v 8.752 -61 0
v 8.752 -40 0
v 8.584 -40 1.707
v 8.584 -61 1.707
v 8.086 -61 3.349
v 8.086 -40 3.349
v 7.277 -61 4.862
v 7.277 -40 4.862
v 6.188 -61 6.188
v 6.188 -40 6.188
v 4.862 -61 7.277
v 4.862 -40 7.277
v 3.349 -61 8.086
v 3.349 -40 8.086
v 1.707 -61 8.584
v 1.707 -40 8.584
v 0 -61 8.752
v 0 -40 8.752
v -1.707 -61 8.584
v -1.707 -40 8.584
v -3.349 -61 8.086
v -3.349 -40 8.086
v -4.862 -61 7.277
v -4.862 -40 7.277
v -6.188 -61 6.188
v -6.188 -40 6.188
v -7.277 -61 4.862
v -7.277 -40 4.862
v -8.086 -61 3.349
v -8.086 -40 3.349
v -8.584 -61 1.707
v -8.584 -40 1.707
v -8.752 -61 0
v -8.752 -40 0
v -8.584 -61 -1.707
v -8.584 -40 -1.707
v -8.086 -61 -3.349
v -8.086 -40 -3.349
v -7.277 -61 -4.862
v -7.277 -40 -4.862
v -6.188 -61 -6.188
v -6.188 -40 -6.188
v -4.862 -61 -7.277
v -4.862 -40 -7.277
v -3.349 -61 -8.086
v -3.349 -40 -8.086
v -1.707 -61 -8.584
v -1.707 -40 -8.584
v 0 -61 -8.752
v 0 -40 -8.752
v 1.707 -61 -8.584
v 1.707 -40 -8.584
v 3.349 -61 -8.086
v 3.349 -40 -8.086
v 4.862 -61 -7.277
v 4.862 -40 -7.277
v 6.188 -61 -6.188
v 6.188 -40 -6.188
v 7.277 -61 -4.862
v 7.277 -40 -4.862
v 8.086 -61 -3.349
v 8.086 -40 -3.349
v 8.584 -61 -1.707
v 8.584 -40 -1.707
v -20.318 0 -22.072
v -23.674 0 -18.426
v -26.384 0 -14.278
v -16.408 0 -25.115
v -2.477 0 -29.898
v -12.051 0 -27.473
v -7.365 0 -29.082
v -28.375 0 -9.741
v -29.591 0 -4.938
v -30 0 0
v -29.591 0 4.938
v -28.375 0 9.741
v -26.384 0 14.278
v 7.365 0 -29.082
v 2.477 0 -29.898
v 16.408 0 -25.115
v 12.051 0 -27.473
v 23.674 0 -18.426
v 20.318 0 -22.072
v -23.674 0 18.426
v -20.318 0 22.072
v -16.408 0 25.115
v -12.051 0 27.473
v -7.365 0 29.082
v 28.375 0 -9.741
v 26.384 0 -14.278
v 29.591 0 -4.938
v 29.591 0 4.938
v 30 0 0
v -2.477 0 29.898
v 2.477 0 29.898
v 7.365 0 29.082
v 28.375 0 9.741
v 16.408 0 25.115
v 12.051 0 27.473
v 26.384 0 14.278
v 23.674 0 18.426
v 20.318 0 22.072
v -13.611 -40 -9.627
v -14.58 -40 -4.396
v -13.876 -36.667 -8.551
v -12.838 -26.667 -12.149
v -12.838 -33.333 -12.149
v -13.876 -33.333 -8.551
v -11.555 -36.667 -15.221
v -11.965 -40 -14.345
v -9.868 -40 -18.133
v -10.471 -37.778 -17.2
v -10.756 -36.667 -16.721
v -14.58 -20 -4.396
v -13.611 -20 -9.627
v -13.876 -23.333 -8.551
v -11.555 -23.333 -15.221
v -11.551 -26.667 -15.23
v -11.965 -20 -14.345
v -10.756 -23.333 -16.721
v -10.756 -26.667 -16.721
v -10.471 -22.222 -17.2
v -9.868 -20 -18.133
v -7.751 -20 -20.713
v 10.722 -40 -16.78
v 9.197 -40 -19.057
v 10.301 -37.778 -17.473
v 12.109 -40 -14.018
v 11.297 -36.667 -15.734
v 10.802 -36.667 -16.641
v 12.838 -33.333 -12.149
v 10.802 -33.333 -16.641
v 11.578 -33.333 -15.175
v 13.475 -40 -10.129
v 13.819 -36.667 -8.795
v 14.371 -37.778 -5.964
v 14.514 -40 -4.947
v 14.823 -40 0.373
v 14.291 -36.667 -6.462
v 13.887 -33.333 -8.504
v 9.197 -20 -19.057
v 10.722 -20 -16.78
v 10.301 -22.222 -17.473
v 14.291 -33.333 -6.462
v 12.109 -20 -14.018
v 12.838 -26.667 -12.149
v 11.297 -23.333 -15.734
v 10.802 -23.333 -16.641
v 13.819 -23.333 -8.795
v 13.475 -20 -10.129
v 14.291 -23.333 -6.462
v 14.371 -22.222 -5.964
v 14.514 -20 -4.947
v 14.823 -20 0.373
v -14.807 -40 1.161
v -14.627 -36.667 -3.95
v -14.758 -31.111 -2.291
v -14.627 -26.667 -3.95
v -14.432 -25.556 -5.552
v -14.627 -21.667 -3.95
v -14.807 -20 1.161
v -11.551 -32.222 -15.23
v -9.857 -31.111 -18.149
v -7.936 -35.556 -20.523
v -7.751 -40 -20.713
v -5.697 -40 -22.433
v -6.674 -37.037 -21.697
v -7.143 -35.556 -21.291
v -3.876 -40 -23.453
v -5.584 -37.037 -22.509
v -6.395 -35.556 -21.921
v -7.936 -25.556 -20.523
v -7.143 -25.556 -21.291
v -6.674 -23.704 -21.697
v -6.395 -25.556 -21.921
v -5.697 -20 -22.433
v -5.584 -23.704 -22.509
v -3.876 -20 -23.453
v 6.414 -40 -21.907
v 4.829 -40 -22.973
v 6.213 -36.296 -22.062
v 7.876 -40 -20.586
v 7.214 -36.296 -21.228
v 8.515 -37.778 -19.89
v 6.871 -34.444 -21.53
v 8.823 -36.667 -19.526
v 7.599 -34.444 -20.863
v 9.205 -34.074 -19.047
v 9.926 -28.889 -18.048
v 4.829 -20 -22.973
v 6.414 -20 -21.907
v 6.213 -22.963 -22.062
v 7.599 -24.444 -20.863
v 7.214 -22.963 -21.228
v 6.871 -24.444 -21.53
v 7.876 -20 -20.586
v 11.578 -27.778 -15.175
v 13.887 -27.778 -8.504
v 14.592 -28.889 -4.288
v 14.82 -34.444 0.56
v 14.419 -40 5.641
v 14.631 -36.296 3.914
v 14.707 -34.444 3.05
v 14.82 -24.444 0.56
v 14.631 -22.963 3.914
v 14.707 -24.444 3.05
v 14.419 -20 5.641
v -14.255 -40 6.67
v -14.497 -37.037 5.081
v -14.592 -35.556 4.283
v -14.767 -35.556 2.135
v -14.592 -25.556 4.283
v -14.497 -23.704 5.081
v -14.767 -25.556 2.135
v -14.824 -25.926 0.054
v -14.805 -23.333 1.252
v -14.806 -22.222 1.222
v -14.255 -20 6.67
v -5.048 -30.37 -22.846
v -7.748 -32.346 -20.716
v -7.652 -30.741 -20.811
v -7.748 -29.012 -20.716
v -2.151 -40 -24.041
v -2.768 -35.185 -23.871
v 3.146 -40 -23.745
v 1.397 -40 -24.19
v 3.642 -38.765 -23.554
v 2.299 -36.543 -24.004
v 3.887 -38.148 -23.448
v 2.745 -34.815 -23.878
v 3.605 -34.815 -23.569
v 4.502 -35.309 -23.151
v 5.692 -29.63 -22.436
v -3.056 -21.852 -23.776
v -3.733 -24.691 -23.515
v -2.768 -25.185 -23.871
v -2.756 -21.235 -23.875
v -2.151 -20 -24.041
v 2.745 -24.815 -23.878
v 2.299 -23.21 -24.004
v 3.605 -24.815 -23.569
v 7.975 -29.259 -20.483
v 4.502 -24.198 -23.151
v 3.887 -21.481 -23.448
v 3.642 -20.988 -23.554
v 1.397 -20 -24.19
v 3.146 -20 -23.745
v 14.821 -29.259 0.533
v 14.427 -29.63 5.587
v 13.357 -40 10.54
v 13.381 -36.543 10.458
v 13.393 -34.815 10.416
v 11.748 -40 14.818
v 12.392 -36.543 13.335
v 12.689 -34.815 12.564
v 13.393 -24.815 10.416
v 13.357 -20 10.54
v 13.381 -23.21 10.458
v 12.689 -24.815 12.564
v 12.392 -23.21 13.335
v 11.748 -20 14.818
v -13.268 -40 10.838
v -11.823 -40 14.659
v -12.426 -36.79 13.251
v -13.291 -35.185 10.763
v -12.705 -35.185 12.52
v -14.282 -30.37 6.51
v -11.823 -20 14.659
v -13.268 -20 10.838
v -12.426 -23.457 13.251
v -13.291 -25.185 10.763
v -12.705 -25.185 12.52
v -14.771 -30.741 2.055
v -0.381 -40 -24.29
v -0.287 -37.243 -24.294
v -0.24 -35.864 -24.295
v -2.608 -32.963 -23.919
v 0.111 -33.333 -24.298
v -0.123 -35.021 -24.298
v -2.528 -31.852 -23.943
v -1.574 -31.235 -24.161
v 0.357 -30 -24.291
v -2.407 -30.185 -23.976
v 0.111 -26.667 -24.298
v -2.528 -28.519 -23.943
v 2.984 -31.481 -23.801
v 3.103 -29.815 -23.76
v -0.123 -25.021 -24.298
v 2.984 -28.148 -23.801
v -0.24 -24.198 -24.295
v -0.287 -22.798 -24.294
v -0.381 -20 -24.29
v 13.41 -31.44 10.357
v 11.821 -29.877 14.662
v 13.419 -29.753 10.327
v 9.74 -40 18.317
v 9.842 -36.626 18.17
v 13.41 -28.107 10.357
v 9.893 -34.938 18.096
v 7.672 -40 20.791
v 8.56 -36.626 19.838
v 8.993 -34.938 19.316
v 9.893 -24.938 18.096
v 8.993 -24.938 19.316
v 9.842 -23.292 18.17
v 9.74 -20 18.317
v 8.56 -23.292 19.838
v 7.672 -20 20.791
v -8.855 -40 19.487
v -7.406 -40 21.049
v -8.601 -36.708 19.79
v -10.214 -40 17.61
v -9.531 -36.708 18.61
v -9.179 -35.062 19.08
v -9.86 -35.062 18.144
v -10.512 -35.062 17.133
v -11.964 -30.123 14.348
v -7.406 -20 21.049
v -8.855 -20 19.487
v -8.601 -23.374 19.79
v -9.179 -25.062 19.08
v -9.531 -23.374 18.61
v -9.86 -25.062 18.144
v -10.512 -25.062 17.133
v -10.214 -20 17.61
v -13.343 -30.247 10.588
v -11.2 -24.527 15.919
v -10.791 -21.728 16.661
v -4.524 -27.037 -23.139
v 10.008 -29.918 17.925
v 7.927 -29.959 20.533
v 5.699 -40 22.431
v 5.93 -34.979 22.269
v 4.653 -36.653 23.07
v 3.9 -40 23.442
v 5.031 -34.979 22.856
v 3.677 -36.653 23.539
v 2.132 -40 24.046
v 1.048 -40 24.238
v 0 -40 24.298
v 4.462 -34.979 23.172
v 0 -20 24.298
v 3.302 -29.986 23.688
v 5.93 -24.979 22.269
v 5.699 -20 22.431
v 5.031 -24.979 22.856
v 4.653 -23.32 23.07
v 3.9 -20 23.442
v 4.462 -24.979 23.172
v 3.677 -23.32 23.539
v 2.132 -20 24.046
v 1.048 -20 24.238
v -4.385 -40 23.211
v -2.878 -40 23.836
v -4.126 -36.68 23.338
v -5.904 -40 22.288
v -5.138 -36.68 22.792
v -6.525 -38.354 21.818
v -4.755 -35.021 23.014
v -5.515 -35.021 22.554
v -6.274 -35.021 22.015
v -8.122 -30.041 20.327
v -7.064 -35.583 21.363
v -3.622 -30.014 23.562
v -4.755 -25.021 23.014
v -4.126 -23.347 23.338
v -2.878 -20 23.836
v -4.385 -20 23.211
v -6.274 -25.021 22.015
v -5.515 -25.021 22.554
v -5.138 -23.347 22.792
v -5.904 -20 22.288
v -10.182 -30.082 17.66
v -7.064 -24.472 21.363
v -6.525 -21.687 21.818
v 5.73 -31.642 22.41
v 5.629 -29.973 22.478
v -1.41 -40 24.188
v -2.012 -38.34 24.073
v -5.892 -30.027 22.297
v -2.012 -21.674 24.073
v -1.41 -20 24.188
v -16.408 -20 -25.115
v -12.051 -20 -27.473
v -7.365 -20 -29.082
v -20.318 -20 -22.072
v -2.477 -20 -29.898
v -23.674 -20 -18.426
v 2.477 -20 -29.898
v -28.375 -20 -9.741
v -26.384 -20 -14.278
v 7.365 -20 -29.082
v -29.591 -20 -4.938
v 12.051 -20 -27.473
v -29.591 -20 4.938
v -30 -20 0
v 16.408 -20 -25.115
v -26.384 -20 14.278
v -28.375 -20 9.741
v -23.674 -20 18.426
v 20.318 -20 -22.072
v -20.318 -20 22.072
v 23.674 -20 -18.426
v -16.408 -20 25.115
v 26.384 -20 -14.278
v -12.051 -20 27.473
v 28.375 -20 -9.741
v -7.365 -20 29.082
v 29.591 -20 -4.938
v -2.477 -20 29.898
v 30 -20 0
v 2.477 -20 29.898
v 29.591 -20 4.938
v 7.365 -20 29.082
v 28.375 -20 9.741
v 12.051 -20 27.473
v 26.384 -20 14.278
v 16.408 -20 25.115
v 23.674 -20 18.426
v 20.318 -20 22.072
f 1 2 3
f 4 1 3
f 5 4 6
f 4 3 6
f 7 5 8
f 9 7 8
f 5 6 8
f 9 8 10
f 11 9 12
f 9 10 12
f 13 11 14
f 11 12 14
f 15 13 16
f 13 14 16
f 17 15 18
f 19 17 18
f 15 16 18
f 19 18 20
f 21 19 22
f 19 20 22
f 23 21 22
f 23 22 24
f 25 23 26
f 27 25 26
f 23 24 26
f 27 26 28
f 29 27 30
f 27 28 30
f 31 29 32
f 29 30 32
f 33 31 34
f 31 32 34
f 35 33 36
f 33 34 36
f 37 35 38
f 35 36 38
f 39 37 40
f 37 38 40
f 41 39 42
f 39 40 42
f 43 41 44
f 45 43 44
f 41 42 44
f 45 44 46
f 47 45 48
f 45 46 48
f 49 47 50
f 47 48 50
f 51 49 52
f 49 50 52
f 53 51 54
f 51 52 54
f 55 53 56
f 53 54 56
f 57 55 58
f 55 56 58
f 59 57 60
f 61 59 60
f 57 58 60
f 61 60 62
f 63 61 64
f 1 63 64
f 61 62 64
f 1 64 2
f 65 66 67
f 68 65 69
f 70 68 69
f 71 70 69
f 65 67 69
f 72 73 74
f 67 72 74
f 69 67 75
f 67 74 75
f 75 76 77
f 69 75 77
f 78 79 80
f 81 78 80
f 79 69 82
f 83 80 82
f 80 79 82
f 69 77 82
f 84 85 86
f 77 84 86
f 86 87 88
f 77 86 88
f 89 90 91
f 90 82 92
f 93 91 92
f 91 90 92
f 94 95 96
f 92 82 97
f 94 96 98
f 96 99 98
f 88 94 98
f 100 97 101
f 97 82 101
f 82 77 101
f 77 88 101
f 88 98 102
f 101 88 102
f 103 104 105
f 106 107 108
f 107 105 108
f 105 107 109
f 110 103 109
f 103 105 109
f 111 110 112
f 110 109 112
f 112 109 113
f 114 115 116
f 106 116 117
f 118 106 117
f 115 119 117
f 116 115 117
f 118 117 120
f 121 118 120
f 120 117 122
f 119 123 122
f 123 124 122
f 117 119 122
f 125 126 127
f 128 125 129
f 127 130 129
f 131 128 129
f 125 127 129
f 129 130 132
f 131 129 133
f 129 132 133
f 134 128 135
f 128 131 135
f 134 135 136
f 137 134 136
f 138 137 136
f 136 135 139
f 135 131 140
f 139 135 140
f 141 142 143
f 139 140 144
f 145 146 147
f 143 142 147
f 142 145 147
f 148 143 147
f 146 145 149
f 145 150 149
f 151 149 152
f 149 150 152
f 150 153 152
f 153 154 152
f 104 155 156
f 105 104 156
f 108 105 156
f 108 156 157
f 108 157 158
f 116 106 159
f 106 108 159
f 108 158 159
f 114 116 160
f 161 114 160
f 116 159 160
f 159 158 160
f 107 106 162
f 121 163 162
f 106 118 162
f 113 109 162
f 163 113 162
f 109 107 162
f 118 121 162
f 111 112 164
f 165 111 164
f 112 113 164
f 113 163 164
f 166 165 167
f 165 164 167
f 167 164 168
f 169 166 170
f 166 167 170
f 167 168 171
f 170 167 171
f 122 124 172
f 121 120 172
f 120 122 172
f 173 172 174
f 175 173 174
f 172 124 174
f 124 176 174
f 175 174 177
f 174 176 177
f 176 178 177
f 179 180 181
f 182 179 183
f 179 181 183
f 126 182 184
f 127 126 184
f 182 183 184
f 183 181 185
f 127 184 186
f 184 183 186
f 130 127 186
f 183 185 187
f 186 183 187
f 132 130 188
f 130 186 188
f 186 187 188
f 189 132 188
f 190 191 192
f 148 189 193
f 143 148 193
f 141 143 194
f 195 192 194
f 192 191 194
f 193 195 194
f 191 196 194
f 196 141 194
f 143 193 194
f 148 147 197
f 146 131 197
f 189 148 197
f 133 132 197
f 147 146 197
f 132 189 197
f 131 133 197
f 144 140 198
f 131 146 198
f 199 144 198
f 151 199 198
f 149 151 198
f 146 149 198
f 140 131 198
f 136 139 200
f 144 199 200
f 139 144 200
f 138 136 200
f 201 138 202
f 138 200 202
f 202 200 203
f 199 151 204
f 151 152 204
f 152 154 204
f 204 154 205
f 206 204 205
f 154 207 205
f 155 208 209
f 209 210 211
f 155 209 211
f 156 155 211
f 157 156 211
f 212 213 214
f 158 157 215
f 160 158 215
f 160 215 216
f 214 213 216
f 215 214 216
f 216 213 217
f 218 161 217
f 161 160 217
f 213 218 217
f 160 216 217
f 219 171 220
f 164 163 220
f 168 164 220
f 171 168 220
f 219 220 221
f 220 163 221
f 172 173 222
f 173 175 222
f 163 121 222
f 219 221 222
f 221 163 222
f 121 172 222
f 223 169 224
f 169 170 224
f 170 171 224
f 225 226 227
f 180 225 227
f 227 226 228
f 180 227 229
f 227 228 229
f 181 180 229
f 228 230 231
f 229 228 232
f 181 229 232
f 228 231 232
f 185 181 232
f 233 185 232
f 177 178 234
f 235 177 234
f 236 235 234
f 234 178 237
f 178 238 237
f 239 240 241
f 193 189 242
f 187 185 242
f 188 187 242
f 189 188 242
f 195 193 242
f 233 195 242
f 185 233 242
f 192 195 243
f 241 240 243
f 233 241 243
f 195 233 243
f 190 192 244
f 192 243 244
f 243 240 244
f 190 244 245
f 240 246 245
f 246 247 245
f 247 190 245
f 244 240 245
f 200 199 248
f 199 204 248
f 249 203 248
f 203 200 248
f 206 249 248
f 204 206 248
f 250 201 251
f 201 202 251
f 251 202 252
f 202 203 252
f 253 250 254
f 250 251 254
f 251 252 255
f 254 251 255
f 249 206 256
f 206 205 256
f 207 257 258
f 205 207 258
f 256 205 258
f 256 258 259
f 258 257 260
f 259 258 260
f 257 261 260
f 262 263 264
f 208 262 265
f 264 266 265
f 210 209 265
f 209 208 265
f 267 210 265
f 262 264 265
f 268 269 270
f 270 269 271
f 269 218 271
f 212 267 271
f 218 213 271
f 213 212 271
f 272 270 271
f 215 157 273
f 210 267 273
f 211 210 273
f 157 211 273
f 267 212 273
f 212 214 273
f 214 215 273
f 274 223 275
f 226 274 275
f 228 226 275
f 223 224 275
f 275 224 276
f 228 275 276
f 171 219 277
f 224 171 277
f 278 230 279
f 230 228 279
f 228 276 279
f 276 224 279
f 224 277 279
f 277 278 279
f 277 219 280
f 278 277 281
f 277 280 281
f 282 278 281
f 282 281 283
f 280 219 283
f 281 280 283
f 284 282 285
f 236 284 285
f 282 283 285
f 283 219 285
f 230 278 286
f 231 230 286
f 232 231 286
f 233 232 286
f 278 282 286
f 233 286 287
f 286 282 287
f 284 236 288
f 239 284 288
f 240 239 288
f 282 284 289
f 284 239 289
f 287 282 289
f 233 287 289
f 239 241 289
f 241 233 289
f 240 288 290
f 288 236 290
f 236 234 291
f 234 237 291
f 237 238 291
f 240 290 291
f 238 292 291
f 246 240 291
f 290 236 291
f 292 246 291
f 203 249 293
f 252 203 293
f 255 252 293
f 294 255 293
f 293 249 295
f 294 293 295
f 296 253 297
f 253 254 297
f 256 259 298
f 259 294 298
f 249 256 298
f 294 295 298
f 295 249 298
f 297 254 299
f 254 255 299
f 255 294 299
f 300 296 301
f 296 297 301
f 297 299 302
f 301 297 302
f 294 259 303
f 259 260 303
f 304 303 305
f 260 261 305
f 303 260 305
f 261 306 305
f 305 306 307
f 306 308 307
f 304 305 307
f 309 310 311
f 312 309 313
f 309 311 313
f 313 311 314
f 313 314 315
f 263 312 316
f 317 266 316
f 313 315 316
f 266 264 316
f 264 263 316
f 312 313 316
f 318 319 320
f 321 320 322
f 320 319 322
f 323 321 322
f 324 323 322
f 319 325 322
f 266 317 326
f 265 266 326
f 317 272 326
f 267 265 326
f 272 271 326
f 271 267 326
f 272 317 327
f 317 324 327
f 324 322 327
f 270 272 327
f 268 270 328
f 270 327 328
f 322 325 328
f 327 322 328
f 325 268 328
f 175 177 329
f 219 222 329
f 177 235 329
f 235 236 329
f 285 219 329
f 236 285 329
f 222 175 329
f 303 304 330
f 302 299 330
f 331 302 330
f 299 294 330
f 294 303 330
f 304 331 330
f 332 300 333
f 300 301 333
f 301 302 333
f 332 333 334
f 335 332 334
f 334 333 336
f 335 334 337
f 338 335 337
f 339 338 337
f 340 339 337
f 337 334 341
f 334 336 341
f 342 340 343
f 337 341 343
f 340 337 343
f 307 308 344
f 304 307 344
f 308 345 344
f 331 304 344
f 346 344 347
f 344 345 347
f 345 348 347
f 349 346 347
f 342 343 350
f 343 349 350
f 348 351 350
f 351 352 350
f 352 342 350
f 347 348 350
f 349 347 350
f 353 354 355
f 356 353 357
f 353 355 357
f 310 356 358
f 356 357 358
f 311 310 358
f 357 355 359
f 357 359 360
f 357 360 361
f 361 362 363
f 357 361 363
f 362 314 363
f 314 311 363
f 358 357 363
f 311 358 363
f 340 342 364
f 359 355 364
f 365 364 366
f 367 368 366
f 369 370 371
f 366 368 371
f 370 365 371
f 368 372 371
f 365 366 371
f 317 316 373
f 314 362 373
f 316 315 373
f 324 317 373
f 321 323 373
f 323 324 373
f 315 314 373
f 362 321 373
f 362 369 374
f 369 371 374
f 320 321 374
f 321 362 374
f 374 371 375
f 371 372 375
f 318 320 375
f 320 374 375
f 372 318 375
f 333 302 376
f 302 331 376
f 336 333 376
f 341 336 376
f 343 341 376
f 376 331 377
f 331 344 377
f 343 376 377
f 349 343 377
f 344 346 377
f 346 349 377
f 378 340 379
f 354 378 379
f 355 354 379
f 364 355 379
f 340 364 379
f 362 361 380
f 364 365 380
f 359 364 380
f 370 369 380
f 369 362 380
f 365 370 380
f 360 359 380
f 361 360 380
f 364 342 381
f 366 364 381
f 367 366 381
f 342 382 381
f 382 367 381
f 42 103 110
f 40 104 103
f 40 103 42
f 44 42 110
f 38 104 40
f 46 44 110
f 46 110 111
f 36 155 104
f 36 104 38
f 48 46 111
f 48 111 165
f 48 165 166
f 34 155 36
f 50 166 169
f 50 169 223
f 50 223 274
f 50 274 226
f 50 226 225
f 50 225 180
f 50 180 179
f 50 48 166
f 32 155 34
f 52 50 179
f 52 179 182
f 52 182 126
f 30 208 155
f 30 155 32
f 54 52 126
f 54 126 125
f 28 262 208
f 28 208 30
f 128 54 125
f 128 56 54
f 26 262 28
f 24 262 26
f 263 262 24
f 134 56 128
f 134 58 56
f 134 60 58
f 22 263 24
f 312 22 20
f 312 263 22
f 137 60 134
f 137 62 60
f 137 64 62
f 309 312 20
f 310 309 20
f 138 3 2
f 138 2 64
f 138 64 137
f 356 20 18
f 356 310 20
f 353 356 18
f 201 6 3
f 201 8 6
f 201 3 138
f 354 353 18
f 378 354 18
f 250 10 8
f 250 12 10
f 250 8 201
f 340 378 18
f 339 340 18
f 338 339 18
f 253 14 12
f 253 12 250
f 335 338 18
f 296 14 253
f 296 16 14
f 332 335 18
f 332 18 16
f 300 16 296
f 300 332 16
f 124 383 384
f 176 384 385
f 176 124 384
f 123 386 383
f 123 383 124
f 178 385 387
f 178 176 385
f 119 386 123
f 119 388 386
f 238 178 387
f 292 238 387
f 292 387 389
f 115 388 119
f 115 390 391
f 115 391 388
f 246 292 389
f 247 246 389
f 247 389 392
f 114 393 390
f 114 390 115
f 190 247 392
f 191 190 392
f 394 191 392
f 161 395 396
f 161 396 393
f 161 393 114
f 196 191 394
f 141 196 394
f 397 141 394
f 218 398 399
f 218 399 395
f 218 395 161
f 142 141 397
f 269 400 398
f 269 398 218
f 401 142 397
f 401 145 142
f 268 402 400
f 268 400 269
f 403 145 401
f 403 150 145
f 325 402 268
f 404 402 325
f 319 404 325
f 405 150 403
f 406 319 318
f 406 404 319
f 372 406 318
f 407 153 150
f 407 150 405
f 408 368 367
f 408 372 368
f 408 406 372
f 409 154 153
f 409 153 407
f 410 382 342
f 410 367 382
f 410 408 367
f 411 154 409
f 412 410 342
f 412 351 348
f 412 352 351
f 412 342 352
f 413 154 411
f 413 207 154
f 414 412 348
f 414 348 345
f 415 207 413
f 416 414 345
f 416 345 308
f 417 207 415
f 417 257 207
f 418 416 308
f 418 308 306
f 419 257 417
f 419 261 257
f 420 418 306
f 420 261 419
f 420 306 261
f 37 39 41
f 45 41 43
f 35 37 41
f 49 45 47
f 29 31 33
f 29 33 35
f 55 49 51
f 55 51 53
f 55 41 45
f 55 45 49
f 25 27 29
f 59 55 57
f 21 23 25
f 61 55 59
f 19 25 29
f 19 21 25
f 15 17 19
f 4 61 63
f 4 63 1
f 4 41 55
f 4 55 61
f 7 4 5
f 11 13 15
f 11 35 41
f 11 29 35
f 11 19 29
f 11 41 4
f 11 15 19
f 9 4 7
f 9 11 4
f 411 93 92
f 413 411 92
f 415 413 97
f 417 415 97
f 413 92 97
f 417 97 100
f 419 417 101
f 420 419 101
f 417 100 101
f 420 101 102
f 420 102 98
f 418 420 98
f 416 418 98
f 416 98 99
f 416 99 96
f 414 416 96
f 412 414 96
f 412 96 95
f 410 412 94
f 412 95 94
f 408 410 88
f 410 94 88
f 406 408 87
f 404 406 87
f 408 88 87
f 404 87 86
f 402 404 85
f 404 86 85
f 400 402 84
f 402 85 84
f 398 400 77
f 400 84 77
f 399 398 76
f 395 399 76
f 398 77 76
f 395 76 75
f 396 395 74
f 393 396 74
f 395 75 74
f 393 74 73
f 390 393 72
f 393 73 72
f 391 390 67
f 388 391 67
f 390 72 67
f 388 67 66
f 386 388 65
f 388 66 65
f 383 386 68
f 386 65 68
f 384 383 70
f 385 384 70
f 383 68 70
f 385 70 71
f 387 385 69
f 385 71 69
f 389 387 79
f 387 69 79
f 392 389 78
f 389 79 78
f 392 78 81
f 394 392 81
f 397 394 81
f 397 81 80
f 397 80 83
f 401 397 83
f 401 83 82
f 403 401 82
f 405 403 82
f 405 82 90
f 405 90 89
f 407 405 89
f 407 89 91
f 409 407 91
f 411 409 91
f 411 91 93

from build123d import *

# Parameters (mm, degrees)
F0_R     = 30
F1_DEPTH = 20
F3_DEPTH = 20
F4_R     = 8.751701
F5_DEPTH = 21


with BuildPart() as f1:
    # F0 (on Front) → F1 (new body)
    with BuildSketch(Plane.XZ):
        Circle(F0_R)
    extrude(amount=F1_DEPTH)

    # F2 (on face) → F3 (join)
    with BuildSketch(Plane.XZ.offset(20)):
        with BuildLine():
            add(Edge.make_bspline(
                [(0, 24.298338), (-25.676575, 24.298338), (-12.838288, -12.149169), (0, -48.596676), (12.838288, -12.149169), (25.676575, 24.298338), (0, 24.298338)],
                knots=[0, 0, 0, 2.094395, 2.094395, 4.18879, 4.18879, 6.283185, 6.283185, 6.283185], degree=2, weights=[1, 0.5, 1, 0.5, 1, 0.5, 1]))
        make_face()
    extrude(amount=F3_DEPTH)

    # F4 (on face) → F5 (join)
    with BuildSketch(Plane.XZ.offset(40)):
        Circle(F4_R)
    extrude(amount=F5_DEPTH)


solid = f1.part
